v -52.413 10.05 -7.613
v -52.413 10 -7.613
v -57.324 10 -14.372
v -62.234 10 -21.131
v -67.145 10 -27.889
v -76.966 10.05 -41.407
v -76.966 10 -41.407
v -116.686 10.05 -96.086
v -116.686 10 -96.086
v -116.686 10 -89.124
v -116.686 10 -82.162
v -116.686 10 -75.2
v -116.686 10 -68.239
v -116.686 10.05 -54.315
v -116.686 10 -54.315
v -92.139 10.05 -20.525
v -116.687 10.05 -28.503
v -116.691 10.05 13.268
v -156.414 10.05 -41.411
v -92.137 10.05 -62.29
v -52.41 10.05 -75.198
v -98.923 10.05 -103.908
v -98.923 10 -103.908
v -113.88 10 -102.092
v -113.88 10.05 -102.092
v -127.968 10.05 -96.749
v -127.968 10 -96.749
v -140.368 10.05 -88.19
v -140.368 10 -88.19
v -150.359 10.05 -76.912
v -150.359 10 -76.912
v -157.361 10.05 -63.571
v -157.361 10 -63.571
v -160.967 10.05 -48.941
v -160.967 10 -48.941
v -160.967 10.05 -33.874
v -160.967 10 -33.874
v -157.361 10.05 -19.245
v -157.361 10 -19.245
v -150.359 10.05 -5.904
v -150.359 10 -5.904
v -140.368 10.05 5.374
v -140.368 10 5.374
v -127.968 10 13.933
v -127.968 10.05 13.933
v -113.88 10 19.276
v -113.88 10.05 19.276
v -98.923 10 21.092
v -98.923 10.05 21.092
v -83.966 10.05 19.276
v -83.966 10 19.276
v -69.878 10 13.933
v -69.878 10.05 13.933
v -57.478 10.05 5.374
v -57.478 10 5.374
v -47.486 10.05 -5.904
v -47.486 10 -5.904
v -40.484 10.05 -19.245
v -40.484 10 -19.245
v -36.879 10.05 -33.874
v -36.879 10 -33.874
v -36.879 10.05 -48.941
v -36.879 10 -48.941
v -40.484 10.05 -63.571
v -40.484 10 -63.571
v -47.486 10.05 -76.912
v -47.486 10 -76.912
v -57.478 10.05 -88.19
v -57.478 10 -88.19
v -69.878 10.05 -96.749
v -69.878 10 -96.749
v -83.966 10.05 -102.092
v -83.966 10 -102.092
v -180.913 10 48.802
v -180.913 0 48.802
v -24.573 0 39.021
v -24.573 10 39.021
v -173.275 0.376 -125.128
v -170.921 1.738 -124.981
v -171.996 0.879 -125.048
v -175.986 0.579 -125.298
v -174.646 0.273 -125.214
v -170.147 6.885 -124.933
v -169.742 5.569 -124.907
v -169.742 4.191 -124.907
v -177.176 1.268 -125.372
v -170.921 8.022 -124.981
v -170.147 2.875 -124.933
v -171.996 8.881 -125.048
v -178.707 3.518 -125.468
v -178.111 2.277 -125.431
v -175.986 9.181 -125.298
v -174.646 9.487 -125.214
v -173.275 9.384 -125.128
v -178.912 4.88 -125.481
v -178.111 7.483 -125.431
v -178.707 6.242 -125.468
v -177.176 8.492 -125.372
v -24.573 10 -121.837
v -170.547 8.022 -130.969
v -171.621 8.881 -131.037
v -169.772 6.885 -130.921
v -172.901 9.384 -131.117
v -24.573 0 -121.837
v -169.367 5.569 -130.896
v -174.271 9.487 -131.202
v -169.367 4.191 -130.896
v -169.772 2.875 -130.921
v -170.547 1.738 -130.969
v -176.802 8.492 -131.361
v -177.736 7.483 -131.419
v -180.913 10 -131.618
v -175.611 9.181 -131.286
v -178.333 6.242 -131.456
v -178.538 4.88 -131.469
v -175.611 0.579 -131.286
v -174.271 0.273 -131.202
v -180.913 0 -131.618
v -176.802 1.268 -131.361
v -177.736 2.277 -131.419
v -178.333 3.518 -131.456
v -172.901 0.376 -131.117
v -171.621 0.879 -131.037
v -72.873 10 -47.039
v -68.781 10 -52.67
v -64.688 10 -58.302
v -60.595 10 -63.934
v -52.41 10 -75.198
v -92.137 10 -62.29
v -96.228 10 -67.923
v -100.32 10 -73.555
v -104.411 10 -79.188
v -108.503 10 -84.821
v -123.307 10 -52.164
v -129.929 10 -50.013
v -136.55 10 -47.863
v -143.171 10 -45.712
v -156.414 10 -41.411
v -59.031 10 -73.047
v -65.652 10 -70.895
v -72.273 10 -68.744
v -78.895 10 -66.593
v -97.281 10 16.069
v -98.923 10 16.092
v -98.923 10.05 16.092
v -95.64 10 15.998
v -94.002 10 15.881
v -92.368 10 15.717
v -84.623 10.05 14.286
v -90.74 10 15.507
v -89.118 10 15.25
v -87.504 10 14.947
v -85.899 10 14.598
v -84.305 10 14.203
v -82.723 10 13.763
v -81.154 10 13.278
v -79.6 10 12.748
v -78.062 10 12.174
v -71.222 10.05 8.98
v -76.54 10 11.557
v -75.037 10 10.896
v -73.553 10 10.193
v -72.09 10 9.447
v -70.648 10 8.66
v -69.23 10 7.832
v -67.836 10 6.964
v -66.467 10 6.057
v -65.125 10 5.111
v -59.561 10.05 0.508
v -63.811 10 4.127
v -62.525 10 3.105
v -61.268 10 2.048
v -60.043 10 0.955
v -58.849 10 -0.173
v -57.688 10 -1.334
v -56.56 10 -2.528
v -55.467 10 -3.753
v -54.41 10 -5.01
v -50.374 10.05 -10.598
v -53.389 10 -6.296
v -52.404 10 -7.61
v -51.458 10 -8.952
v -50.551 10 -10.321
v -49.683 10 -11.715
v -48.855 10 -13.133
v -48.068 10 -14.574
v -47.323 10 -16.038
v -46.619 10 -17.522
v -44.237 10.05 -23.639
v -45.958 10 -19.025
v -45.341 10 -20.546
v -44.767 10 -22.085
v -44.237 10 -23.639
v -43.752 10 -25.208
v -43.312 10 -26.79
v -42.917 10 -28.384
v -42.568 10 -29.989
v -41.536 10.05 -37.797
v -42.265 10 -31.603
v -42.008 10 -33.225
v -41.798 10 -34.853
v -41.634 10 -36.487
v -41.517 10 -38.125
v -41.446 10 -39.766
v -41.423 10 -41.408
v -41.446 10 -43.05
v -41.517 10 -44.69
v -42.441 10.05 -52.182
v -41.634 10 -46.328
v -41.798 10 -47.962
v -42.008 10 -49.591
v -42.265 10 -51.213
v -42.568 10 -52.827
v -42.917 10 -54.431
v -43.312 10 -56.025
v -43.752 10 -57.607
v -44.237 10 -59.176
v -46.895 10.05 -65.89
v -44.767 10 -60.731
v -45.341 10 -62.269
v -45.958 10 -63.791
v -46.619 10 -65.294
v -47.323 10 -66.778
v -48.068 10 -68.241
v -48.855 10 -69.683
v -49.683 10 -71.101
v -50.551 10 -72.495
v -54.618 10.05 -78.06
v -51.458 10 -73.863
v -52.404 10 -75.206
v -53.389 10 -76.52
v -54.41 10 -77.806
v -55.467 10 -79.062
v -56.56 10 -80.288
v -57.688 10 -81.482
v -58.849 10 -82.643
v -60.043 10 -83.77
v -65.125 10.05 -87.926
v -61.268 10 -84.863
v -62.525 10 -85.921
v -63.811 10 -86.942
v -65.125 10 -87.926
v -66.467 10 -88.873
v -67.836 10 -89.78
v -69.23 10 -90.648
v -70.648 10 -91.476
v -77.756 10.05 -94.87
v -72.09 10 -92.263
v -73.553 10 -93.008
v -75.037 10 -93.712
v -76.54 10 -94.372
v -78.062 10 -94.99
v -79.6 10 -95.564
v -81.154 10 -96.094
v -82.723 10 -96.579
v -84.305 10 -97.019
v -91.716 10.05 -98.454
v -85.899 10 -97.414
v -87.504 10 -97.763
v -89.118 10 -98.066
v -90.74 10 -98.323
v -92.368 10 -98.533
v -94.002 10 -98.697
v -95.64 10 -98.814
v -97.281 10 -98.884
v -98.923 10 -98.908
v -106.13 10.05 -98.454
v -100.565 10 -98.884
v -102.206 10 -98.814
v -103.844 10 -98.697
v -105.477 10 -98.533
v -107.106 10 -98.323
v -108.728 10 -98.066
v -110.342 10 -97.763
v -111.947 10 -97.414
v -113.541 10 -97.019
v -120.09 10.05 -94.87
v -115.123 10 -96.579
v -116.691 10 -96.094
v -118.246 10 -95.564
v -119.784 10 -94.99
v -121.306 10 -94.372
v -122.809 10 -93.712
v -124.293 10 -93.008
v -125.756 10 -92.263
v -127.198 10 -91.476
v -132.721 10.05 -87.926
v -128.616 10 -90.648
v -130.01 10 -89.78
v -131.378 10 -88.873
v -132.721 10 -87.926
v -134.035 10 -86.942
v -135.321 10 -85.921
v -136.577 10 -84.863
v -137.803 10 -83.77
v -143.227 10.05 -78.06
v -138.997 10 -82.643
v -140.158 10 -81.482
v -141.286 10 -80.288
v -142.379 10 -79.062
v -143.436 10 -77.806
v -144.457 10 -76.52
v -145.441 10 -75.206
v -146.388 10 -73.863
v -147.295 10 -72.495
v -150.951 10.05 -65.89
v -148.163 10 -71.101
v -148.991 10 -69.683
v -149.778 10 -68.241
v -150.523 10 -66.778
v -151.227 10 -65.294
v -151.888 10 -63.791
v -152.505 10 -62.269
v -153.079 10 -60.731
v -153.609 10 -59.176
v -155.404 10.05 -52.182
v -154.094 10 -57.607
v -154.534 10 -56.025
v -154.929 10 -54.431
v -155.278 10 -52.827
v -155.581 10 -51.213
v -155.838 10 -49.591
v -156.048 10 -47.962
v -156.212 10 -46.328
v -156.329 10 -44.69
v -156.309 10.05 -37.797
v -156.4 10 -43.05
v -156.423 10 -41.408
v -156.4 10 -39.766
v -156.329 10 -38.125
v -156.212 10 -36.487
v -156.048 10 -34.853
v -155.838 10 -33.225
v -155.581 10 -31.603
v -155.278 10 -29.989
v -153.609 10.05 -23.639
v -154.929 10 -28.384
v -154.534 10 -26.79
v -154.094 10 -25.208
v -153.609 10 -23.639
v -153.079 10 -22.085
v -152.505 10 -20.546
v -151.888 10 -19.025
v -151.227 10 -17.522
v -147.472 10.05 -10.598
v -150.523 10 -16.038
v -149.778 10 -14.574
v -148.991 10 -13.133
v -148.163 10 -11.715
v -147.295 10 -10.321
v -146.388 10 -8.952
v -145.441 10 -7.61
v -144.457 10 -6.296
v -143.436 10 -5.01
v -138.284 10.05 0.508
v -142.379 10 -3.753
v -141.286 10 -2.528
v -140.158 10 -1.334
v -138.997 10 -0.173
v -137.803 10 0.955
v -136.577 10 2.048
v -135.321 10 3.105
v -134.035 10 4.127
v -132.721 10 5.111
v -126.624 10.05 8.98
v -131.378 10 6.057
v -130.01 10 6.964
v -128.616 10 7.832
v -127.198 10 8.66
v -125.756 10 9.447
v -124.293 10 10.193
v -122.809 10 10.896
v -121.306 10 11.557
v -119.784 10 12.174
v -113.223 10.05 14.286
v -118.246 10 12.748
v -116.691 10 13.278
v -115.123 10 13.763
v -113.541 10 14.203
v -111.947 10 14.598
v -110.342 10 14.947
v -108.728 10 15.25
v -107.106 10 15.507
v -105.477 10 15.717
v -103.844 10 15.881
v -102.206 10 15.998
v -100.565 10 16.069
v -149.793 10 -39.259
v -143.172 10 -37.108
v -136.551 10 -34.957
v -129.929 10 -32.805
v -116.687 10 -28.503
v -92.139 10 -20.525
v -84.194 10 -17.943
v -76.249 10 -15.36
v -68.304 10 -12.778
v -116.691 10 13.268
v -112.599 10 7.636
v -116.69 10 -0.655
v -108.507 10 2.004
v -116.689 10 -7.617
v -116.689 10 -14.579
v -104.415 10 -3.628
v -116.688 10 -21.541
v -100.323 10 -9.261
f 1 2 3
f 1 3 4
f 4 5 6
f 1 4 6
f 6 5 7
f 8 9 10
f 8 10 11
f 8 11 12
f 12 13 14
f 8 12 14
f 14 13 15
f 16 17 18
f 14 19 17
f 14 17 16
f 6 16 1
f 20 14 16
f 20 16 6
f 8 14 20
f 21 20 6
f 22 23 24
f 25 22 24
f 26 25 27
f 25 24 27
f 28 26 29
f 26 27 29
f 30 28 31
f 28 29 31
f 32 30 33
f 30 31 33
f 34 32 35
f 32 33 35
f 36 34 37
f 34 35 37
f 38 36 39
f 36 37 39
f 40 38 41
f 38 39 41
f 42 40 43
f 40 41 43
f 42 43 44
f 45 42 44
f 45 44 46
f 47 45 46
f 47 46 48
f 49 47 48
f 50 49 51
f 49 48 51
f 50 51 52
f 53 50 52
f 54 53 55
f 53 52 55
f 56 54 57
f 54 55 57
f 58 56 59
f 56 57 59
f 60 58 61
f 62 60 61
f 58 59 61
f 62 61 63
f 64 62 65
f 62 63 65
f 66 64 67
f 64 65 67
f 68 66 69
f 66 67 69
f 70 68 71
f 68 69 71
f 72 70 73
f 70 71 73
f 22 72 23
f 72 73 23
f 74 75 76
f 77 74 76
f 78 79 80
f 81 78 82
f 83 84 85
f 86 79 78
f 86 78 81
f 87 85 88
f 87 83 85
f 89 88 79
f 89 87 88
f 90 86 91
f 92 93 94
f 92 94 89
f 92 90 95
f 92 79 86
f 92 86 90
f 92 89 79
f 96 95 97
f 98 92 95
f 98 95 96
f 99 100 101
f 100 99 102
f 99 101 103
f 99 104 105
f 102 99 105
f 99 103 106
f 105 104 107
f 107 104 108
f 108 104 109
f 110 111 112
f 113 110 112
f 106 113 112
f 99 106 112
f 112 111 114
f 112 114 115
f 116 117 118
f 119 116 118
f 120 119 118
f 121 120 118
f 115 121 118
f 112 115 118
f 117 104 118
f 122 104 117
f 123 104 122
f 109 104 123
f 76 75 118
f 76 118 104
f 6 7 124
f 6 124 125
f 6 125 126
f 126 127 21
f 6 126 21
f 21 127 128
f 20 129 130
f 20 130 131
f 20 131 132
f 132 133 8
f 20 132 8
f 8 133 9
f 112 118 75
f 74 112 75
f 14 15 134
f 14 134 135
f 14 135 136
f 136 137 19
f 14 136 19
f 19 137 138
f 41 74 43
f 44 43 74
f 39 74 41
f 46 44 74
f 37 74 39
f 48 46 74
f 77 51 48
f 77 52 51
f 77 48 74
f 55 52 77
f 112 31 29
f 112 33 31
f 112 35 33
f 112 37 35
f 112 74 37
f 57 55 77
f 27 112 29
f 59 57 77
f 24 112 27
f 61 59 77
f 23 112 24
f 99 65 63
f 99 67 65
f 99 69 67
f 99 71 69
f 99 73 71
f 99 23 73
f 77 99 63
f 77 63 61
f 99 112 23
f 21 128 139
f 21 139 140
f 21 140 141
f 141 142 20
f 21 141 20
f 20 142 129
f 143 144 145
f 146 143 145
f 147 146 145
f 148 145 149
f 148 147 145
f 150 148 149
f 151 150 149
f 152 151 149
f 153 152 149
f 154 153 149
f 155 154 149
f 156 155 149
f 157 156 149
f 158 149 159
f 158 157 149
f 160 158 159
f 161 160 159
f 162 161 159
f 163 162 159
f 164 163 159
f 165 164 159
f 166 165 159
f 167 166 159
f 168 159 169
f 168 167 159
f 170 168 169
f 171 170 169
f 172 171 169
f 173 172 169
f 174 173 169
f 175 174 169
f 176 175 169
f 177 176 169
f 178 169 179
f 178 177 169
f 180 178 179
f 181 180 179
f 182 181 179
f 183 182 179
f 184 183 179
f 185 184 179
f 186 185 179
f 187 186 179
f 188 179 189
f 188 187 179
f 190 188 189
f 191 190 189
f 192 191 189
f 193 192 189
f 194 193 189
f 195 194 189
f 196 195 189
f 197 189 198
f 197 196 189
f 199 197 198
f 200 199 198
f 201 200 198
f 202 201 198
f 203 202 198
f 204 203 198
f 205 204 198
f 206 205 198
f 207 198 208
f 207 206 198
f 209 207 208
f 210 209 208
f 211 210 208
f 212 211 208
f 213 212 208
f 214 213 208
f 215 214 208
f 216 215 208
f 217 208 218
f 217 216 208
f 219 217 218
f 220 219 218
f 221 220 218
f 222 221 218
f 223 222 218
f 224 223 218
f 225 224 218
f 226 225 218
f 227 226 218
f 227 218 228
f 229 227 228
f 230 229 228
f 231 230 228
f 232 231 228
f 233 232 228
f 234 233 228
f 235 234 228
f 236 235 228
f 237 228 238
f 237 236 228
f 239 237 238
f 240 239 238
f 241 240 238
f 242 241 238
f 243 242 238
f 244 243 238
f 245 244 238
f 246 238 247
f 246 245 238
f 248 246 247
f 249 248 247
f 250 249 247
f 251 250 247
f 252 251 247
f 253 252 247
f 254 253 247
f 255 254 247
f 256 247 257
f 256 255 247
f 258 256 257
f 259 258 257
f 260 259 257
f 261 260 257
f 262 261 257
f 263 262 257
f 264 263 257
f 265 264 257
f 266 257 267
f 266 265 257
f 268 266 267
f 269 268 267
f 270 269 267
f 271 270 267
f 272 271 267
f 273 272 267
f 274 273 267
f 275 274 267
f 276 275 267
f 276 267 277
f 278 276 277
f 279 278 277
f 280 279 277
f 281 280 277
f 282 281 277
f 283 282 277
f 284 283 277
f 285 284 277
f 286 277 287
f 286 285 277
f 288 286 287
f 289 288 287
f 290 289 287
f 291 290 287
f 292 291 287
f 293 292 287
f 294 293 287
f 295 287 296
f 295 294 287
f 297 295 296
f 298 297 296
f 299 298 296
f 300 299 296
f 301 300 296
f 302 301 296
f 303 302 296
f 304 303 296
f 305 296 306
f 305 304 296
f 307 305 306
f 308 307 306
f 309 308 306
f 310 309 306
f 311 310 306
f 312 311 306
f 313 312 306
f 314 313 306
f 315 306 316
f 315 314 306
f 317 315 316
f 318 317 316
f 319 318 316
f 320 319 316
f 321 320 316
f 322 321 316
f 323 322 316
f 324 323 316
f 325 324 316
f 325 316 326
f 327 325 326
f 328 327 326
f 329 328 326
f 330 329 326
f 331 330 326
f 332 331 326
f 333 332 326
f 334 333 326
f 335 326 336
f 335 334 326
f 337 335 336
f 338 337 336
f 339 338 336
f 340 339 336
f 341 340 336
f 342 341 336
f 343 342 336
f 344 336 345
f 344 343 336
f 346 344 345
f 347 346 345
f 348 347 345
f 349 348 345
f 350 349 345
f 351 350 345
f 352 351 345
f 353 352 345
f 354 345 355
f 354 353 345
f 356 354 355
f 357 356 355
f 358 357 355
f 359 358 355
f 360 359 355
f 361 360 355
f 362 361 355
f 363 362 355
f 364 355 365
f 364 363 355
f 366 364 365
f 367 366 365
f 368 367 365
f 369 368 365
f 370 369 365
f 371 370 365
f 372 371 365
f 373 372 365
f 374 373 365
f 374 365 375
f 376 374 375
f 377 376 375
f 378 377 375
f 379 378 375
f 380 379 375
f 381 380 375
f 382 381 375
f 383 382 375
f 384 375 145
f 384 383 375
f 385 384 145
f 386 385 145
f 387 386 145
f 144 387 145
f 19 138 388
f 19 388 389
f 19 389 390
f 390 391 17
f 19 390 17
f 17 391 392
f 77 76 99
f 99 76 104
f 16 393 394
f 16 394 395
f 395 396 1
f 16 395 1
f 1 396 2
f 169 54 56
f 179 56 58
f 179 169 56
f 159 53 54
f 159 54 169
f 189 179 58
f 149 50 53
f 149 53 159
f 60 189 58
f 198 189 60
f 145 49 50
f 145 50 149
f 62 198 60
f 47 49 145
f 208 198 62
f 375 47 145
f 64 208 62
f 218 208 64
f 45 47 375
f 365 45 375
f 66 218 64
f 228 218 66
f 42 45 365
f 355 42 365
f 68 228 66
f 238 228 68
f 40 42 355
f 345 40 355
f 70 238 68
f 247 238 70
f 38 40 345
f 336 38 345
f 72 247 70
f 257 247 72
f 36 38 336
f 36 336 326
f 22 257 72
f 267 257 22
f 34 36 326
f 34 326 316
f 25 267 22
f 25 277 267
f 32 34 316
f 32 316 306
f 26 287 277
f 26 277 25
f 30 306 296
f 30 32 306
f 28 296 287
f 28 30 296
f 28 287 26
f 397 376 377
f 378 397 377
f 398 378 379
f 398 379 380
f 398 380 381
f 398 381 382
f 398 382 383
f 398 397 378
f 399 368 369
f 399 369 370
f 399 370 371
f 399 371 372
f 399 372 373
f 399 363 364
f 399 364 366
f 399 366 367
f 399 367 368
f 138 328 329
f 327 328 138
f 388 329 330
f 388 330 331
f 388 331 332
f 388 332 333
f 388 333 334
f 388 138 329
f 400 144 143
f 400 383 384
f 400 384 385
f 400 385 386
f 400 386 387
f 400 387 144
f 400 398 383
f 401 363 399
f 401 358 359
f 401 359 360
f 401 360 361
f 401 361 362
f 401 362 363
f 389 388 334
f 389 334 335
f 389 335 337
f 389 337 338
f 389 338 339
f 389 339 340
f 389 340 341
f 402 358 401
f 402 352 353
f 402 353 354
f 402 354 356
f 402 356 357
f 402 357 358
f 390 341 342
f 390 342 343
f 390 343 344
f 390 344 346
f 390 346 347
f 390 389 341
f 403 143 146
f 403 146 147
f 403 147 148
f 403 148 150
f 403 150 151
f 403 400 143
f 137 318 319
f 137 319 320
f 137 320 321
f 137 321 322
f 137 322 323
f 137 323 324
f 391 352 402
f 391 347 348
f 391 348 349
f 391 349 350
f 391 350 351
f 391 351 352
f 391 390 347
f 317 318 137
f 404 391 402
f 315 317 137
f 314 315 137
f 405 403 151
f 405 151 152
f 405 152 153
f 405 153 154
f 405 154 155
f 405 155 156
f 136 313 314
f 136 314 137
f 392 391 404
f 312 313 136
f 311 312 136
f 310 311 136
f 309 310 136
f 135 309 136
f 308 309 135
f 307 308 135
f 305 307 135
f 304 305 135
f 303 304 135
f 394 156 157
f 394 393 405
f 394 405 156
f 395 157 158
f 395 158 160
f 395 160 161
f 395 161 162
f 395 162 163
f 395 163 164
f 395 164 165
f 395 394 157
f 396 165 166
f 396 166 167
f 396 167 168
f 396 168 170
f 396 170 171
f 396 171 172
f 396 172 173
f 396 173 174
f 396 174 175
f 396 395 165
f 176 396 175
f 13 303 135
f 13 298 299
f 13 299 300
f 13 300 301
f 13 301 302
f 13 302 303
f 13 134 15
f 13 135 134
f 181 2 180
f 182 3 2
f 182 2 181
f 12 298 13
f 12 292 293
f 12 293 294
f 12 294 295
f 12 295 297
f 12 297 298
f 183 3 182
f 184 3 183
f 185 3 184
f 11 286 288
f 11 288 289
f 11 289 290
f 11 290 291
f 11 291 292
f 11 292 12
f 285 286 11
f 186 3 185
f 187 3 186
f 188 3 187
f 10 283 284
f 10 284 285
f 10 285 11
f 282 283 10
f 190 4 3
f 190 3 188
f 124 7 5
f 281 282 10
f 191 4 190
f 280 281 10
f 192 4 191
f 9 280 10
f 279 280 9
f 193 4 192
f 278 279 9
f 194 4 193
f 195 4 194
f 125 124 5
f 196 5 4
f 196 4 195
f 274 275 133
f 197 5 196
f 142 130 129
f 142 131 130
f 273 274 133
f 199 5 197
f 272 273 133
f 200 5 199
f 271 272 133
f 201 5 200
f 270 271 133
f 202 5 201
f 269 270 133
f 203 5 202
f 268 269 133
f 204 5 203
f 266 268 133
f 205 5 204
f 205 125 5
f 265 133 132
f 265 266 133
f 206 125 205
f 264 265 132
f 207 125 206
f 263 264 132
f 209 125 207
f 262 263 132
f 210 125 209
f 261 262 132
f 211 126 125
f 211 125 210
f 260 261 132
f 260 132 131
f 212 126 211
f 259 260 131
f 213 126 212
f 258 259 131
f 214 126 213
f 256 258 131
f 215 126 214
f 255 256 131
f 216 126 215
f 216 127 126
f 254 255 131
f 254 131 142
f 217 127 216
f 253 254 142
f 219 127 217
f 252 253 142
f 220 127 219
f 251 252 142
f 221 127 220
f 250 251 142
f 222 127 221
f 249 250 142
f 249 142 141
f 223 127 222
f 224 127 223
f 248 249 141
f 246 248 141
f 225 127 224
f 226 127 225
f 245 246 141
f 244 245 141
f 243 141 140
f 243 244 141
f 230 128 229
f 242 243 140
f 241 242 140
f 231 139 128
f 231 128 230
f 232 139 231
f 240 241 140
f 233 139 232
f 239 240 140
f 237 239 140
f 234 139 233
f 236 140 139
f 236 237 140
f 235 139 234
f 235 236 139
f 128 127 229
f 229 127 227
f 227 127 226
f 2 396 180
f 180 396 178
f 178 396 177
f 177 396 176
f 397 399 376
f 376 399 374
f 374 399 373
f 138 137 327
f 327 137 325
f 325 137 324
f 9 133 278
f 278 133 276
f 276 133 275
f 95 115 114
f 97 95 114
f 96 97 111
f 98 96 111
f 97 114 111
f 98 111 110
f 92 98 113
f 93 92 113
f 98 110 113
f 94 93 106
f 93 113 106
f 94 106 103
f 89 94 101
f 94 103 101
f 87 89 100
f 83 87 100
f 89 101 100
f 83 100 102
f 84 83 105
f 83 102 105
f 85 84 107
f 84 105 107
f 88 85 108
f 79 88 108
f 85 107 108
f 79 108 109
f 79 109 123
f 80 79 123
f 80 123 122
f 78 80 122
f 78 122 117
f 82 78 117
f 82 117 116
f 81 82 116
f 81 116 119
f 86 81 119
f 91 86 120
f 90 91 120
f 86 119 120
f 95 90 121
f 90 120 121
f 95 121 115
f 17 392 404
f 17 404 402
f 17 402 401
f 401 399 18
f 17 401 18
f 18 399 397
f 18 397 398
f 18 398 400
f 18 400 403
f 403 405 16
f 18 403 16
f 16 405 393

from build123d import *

# Parameters (mm, degrees)
BOSS_EXTRUDE1_DEPTH = 10
SKETCH3_R           = 4.62
CUT_EXTRUDE3_DEPTH  = 6
SKETCH4_R           = 62.5
SKETCH4_R_2         = 57.5
BOSS_EXTRUDE2_DEPTH = 0.05


with BuildPart() as part:
    # Sketch1 → Boss-Extrude1 (new body)
    with BuildSketch(Plane(origin=(0, 0, 0), x_dir=(1, 0, 0), z_dir=(0, 1, 0))):
        Polygon((-180.91295082, 131.617868852), (-180.91295082, -48.802131148), (-24.57295082, -39.020839837), (-24.57295082, 121.836577542), align=None)
    extrude(amount=BOSS_EXTRUDE1_DEPTH)

    # Sketch3 → Cut-Extrude3 (cut)
    with BuildSketch(Plane(origin=(7.497080179, 0, -119.83014083), x_dir=(-0.9980485856506585, 0, -0.062442138662287344), z_dir=(0.062442138662287344, 0, -0.9980485856506585))):
        with Locations((181.778415909, 4.88)):
            Circle(SKETCH3_R)
    extrude(amount=-CUT_EXTRUDE3_DEPTH, mode=Mode.SUBTRACT)

    # Sketch4 → Boss-Extrude2 (add)
    # profile 1 of 2: a face of its own
    with BuildSketch(Plane(origin=(0, 10, 0), x_dir=(1, 0, 0), z_dir=(0, 1, 0))):
        with Locations(Location((-98.92295082, 41.407868852, 0), (0, 0, 90))):
            Circle(SKETCH4_R)
        with Locations(Location((-98.92295082, 41.407868852, 0), (0, 0, 270))):
            Circle(SKETCH4_R_2, mode=Mode.SUBTRACT)
    # profile 2 of 2: a face of its own
    with BuildSketch(Plane(origin=(0, 10, 0), x_dir=(1, 0, 0), z_dir=(0, 1, 0))):
        Polygon((-76.965923859, 41.406760564), (-52.409995832, 75.197921831), (-92.136802298, 62.289899942), (-116.685907341, 96.086018397), (-116.685907341, 54.314782109), (-156.414016678, 41.410770734), (-116.687210213, 28.502748845), (-116.691427048, -13.26848723), (-92.138910388, 20.525152803), (-52.413407199, 7.613120531), align=None)
    extrude(amount=BOSS_EXTRUDE2_DEPTH)


solid = part.part
